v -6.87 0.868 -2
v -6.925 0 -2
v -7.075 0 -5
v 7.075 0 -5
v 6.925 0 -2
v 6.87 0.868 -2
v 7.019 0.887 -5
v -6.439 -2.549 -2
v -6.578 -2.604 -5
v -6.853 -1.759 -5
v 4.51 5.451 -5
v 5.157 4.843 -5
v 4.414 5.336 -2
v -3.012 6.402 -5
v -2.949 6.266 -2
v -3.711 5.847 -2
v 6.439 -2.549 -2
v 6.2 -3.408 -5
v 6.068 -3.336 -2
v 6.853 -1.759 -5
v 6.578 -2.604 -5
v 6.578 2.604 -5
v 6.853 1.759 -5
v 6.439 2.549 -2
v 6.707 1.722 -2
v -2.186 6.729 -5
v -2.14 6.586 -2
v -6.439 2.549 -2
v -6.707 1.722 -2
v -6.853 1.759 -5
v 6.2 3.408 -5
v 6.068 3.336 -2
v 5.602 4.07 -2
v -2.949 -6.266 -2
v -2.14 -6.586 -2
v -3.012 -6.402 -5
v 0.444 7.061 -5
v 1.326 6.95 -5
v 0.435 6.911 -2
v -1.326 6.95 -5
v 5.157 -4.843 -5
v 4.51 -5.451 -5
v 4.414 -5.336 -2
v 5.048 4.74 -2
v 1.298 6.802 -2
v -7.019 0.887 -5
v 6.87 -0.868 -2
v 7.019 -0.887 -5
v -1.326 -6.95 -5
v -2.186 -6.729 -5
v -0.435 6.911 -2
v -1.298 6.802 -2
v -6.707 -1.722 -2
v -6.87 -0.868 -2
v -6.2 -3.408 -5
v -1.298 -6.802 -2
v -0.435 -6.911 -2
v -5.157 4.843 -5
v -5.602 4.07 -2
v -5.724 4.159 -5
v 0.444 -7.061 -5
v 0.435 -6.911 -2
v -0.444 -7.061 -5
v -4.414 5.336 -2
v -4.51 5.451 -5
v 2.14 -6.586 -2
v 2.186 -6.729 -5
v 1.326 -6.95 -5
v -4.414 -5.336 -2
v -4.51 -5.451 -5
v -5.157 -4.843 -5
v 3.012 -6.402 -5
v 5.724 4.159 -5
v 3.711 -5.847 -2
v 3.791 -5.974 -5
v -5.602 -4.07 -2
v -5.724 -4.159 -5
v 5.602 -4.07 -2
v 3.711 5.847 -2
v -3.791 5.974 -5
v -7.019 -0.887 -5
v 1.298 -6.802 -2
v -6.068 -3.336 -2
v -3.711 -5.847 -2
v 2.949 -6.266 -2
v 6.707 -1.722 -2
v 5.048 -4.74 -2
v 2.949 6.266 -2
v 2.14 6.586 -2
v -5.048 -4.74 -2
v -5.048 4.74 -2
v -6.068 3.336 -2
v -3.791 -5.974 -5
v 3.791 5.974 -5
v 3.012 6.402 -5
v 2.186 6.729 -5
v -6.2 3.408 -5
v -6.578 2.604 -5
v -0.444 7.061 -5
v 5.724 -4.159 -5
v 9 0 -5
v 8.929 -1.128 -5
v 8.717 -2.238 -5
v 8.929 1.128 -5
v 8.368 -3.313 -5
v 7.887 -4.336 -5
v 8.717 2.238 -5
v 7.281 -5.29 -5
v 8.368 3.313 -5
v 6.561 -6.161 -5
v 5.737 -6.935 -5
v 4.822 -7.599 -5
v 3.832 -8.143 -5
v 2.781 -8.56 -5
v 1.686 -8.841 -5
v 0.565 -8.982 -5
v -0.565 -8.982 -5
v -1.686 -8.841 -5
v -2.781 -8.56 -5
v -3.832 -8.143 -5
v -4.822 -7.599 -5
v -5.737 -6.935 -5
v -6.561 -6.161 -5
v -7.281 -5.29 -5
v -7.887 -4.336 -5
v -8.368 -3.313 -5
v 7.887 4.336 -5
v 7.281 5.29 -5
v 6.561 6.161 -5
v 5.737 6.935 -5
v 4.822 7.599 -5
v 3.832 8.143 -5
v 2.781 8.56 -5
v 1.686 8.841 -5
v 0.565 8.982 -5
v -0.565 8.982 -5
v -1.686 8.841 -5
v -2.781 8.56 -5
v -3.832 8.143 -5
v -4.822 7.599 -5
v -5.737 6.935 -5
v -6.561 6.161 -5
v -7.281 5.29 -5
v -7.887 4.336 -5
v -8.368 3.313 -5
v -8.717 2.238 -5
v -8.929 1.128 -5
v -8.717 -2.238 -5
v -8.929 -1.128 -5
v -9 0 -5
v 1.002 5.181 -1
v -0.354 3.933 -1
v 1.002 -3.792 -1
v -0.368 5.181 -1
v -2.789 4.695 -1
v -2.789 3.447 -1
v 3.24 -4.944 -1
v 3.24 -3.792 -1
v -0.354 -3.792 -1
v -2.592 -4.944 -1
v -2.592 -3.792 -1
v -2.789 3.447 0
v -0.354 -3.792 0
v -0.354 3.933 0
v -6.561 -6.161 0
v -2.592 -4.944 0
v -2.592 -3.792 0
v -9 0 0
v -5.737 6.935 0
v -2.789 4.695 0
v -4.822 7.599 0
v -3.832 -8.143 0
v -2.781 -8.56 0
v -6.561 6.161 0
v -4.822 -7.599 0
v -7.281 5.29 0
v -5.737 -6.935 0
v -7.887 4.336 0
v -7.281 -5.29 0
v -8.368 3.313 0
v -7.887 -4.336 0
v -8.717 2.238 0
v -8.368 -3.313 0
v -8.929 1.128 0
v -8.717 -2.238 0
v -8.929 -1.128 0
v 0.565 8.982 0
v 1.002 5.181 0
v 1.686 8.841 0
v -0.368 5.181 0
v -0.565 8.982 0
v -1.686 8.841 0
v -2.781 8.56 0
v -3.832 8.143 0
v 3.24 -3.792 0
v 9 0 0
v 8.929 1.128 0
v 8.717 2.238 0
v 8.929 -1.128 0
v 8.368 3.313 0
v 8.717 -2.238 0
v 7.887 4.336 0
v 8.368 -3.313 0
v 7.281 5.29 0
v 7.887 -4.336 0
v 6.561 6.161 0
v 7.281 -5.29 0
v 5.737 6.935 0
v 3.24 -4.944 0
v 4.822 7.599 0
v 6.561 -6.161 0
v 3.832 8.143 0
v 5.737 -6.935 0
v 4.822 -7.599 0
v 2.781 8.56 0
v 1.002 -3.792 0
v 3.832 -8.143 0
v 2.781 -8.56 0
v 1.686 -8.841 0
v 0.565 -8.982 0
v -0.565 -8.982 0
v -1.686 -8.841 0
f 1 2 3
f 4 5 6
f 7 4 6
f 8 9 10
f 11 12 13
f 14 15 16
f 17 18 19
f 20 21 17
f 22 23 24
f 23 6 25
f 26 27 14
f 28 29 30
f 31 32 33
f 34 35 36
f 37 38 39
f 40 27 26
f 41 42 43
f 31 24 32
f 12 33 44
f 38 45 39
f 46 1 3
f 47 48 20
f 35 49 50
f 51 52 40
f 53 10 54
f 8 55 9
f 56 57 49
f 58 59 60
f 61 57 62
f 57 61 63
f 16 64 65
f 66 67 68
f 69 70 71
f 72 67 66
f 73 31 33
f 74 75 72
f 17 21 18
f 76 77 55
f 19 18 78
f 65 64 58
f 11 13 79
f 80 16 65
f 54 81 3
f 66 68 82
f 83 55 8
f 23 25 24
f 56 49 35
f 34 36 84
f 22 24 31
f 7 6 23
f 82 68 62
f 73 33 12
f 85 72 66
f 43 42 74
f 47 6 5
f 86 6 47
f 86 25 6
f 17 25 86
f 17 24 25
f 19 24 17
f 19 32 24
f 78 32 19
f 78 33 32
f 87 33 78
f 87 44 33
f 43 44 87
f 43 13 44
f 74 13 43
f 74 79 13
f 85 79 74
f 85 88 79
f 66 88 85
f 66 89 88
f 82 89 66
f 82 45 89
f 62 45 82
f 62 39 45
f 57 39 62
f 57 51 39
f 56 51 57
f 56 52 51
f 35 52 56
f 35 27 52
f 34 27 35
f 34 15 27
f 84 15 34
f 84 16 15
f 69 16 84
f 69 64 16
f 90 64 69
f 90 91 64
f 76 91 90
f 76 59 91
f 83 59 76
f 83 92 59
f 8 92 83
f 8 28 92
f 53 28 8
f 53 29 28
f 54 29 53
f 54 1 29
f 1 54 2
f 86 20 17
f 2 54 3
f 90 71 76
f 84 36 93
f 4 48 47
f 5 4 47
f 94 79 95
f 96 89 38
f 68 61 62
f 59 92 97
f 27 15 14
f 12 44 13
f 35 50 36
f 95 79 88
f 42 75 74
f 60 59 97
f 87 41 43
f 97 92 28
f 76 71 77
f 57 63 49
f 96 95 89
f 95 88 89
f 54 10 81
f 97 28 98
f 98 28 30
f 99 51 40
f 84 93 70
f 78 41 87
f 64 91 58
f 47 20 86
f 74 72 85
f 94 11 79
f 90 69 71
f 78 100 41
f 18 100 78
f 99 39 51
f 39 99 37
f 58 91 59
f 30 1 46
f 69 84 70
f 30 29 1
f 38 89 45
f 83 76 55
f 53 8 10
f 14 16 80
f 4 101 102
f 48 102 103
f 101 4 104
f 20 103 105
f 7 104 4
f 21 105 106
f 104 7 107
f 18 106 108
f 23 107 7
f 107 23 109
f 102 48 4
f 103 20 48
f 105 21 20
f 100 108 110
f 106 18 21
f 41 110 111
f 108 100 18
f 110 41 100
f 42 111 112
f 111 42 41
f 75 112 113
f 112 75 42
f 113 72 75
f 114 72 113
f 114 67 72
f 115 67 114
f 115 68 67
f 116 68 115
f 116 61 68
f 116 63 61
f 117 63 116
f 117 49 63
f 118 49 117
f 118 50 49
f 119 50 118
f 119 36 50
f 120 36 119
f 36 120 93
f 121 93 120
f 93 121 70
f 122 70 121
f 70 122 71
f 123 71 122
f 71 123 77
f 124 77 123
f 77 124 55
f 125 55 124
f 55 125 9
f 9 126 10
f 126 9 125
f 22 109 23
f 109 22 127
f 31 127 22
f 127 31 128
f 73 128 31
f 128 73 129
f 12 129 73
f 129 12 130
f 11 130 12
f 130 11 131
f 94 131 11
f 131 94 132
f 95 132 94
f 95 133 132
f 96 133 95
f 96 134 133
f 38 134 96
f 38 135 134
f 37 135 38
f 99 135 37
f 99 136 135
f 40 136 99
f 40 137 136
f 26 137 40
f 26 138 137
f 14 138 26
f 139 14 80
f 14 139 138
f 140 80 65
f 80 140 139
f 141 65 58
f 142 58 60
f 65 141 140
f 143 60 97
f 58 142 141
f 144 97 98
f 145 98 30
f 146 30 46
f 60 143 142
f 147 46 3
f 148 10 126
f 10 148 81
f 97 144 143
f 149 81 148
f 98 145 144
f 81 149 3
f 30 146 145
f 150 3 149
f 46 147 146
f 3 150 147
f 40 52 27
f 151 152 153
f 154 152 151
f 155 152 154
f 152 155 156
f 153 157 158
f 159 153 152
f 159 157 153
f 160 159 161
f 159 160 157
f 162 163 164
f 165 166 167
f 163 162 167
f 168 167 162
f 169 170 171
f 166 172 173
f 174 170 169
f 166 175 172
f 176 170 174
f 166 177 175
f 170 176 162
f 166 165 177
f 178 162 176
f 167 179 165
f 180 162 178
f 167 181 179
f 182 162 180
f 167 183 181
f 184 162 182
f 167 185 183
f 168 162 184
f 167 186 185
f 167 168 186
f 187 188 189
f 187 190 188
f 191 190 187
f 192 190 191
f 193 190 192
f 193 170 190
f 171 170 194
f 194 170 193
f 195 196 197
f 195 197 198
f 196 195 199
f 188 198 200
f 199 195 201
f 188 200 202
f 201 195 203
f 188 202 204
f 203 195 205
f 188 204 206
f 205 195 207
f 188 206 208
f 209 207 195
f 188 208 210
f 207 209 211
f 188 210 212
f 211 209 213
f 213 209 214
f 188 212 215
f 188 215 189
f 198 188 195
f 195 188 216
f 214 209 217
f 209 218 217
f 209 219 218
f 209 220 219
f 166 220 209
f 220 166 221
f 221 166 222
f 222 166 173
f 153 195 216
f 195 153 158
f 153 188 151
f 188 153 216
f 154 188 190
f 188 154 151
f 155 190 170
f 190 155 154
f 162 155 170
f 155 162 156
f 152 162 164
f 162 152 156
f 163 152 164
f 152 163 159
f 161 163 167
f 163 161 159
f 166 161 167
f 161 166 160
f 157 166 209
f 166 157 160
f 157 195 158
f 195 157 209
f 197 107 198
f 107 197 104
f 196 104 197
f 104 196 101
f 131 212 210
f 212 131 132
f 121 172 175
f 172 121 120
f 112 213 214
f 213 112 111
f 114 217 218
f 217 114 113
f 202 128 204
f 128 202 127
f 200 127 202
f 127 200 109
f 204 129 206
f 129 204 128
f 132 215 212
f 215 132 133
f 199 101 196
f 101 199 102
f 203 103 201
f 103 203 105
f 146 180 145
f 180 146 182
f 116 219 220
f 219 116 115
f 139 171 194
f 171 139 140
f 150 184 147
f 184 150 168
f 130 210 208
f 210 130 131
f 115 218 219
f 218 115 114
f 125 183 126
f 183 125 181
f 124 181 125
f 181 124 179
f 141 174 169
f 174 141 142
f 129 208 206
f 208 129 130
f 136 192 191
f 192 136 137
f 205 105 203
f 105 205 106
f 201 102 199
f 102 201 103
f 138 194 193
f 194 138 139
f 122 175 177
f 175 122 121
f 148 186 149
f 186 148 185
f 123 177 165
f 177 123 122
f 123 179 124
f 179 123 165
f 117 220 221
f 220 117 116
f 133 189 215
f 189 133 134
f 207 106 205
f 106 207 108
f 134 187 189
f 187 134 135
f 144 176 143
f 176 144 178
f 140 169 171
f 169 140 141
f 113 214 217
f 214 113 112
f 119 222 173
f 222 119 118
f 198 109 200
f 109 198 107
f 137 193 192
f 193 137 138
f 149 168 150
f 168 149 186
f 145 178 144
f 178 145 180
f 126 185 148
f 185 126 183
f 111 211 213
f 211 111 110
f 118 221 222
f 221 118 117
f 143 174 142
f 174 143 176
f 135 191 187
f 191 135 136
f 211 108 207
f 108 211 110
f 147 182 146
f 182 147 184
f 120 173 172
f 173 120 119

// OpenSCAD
$fn = 50;

difference() {
	union() {
		translate(v = [0, 0, -5.0]) {
			cylinder(h = 5, r = 9.0);
		}
	}
	union() {
		#translate(v = [0, 0, -5.0]) {
			cylinder(h = 3, r1 = 7.075, r2 = 6.925);
		}
		translate(v = [0, 0, -1]) {
			linear_extrude(height = 1) {
				text(font = "Impact", halign = "center", size = 10, text = "1", valign = "center");
			}
		}
	}
}
